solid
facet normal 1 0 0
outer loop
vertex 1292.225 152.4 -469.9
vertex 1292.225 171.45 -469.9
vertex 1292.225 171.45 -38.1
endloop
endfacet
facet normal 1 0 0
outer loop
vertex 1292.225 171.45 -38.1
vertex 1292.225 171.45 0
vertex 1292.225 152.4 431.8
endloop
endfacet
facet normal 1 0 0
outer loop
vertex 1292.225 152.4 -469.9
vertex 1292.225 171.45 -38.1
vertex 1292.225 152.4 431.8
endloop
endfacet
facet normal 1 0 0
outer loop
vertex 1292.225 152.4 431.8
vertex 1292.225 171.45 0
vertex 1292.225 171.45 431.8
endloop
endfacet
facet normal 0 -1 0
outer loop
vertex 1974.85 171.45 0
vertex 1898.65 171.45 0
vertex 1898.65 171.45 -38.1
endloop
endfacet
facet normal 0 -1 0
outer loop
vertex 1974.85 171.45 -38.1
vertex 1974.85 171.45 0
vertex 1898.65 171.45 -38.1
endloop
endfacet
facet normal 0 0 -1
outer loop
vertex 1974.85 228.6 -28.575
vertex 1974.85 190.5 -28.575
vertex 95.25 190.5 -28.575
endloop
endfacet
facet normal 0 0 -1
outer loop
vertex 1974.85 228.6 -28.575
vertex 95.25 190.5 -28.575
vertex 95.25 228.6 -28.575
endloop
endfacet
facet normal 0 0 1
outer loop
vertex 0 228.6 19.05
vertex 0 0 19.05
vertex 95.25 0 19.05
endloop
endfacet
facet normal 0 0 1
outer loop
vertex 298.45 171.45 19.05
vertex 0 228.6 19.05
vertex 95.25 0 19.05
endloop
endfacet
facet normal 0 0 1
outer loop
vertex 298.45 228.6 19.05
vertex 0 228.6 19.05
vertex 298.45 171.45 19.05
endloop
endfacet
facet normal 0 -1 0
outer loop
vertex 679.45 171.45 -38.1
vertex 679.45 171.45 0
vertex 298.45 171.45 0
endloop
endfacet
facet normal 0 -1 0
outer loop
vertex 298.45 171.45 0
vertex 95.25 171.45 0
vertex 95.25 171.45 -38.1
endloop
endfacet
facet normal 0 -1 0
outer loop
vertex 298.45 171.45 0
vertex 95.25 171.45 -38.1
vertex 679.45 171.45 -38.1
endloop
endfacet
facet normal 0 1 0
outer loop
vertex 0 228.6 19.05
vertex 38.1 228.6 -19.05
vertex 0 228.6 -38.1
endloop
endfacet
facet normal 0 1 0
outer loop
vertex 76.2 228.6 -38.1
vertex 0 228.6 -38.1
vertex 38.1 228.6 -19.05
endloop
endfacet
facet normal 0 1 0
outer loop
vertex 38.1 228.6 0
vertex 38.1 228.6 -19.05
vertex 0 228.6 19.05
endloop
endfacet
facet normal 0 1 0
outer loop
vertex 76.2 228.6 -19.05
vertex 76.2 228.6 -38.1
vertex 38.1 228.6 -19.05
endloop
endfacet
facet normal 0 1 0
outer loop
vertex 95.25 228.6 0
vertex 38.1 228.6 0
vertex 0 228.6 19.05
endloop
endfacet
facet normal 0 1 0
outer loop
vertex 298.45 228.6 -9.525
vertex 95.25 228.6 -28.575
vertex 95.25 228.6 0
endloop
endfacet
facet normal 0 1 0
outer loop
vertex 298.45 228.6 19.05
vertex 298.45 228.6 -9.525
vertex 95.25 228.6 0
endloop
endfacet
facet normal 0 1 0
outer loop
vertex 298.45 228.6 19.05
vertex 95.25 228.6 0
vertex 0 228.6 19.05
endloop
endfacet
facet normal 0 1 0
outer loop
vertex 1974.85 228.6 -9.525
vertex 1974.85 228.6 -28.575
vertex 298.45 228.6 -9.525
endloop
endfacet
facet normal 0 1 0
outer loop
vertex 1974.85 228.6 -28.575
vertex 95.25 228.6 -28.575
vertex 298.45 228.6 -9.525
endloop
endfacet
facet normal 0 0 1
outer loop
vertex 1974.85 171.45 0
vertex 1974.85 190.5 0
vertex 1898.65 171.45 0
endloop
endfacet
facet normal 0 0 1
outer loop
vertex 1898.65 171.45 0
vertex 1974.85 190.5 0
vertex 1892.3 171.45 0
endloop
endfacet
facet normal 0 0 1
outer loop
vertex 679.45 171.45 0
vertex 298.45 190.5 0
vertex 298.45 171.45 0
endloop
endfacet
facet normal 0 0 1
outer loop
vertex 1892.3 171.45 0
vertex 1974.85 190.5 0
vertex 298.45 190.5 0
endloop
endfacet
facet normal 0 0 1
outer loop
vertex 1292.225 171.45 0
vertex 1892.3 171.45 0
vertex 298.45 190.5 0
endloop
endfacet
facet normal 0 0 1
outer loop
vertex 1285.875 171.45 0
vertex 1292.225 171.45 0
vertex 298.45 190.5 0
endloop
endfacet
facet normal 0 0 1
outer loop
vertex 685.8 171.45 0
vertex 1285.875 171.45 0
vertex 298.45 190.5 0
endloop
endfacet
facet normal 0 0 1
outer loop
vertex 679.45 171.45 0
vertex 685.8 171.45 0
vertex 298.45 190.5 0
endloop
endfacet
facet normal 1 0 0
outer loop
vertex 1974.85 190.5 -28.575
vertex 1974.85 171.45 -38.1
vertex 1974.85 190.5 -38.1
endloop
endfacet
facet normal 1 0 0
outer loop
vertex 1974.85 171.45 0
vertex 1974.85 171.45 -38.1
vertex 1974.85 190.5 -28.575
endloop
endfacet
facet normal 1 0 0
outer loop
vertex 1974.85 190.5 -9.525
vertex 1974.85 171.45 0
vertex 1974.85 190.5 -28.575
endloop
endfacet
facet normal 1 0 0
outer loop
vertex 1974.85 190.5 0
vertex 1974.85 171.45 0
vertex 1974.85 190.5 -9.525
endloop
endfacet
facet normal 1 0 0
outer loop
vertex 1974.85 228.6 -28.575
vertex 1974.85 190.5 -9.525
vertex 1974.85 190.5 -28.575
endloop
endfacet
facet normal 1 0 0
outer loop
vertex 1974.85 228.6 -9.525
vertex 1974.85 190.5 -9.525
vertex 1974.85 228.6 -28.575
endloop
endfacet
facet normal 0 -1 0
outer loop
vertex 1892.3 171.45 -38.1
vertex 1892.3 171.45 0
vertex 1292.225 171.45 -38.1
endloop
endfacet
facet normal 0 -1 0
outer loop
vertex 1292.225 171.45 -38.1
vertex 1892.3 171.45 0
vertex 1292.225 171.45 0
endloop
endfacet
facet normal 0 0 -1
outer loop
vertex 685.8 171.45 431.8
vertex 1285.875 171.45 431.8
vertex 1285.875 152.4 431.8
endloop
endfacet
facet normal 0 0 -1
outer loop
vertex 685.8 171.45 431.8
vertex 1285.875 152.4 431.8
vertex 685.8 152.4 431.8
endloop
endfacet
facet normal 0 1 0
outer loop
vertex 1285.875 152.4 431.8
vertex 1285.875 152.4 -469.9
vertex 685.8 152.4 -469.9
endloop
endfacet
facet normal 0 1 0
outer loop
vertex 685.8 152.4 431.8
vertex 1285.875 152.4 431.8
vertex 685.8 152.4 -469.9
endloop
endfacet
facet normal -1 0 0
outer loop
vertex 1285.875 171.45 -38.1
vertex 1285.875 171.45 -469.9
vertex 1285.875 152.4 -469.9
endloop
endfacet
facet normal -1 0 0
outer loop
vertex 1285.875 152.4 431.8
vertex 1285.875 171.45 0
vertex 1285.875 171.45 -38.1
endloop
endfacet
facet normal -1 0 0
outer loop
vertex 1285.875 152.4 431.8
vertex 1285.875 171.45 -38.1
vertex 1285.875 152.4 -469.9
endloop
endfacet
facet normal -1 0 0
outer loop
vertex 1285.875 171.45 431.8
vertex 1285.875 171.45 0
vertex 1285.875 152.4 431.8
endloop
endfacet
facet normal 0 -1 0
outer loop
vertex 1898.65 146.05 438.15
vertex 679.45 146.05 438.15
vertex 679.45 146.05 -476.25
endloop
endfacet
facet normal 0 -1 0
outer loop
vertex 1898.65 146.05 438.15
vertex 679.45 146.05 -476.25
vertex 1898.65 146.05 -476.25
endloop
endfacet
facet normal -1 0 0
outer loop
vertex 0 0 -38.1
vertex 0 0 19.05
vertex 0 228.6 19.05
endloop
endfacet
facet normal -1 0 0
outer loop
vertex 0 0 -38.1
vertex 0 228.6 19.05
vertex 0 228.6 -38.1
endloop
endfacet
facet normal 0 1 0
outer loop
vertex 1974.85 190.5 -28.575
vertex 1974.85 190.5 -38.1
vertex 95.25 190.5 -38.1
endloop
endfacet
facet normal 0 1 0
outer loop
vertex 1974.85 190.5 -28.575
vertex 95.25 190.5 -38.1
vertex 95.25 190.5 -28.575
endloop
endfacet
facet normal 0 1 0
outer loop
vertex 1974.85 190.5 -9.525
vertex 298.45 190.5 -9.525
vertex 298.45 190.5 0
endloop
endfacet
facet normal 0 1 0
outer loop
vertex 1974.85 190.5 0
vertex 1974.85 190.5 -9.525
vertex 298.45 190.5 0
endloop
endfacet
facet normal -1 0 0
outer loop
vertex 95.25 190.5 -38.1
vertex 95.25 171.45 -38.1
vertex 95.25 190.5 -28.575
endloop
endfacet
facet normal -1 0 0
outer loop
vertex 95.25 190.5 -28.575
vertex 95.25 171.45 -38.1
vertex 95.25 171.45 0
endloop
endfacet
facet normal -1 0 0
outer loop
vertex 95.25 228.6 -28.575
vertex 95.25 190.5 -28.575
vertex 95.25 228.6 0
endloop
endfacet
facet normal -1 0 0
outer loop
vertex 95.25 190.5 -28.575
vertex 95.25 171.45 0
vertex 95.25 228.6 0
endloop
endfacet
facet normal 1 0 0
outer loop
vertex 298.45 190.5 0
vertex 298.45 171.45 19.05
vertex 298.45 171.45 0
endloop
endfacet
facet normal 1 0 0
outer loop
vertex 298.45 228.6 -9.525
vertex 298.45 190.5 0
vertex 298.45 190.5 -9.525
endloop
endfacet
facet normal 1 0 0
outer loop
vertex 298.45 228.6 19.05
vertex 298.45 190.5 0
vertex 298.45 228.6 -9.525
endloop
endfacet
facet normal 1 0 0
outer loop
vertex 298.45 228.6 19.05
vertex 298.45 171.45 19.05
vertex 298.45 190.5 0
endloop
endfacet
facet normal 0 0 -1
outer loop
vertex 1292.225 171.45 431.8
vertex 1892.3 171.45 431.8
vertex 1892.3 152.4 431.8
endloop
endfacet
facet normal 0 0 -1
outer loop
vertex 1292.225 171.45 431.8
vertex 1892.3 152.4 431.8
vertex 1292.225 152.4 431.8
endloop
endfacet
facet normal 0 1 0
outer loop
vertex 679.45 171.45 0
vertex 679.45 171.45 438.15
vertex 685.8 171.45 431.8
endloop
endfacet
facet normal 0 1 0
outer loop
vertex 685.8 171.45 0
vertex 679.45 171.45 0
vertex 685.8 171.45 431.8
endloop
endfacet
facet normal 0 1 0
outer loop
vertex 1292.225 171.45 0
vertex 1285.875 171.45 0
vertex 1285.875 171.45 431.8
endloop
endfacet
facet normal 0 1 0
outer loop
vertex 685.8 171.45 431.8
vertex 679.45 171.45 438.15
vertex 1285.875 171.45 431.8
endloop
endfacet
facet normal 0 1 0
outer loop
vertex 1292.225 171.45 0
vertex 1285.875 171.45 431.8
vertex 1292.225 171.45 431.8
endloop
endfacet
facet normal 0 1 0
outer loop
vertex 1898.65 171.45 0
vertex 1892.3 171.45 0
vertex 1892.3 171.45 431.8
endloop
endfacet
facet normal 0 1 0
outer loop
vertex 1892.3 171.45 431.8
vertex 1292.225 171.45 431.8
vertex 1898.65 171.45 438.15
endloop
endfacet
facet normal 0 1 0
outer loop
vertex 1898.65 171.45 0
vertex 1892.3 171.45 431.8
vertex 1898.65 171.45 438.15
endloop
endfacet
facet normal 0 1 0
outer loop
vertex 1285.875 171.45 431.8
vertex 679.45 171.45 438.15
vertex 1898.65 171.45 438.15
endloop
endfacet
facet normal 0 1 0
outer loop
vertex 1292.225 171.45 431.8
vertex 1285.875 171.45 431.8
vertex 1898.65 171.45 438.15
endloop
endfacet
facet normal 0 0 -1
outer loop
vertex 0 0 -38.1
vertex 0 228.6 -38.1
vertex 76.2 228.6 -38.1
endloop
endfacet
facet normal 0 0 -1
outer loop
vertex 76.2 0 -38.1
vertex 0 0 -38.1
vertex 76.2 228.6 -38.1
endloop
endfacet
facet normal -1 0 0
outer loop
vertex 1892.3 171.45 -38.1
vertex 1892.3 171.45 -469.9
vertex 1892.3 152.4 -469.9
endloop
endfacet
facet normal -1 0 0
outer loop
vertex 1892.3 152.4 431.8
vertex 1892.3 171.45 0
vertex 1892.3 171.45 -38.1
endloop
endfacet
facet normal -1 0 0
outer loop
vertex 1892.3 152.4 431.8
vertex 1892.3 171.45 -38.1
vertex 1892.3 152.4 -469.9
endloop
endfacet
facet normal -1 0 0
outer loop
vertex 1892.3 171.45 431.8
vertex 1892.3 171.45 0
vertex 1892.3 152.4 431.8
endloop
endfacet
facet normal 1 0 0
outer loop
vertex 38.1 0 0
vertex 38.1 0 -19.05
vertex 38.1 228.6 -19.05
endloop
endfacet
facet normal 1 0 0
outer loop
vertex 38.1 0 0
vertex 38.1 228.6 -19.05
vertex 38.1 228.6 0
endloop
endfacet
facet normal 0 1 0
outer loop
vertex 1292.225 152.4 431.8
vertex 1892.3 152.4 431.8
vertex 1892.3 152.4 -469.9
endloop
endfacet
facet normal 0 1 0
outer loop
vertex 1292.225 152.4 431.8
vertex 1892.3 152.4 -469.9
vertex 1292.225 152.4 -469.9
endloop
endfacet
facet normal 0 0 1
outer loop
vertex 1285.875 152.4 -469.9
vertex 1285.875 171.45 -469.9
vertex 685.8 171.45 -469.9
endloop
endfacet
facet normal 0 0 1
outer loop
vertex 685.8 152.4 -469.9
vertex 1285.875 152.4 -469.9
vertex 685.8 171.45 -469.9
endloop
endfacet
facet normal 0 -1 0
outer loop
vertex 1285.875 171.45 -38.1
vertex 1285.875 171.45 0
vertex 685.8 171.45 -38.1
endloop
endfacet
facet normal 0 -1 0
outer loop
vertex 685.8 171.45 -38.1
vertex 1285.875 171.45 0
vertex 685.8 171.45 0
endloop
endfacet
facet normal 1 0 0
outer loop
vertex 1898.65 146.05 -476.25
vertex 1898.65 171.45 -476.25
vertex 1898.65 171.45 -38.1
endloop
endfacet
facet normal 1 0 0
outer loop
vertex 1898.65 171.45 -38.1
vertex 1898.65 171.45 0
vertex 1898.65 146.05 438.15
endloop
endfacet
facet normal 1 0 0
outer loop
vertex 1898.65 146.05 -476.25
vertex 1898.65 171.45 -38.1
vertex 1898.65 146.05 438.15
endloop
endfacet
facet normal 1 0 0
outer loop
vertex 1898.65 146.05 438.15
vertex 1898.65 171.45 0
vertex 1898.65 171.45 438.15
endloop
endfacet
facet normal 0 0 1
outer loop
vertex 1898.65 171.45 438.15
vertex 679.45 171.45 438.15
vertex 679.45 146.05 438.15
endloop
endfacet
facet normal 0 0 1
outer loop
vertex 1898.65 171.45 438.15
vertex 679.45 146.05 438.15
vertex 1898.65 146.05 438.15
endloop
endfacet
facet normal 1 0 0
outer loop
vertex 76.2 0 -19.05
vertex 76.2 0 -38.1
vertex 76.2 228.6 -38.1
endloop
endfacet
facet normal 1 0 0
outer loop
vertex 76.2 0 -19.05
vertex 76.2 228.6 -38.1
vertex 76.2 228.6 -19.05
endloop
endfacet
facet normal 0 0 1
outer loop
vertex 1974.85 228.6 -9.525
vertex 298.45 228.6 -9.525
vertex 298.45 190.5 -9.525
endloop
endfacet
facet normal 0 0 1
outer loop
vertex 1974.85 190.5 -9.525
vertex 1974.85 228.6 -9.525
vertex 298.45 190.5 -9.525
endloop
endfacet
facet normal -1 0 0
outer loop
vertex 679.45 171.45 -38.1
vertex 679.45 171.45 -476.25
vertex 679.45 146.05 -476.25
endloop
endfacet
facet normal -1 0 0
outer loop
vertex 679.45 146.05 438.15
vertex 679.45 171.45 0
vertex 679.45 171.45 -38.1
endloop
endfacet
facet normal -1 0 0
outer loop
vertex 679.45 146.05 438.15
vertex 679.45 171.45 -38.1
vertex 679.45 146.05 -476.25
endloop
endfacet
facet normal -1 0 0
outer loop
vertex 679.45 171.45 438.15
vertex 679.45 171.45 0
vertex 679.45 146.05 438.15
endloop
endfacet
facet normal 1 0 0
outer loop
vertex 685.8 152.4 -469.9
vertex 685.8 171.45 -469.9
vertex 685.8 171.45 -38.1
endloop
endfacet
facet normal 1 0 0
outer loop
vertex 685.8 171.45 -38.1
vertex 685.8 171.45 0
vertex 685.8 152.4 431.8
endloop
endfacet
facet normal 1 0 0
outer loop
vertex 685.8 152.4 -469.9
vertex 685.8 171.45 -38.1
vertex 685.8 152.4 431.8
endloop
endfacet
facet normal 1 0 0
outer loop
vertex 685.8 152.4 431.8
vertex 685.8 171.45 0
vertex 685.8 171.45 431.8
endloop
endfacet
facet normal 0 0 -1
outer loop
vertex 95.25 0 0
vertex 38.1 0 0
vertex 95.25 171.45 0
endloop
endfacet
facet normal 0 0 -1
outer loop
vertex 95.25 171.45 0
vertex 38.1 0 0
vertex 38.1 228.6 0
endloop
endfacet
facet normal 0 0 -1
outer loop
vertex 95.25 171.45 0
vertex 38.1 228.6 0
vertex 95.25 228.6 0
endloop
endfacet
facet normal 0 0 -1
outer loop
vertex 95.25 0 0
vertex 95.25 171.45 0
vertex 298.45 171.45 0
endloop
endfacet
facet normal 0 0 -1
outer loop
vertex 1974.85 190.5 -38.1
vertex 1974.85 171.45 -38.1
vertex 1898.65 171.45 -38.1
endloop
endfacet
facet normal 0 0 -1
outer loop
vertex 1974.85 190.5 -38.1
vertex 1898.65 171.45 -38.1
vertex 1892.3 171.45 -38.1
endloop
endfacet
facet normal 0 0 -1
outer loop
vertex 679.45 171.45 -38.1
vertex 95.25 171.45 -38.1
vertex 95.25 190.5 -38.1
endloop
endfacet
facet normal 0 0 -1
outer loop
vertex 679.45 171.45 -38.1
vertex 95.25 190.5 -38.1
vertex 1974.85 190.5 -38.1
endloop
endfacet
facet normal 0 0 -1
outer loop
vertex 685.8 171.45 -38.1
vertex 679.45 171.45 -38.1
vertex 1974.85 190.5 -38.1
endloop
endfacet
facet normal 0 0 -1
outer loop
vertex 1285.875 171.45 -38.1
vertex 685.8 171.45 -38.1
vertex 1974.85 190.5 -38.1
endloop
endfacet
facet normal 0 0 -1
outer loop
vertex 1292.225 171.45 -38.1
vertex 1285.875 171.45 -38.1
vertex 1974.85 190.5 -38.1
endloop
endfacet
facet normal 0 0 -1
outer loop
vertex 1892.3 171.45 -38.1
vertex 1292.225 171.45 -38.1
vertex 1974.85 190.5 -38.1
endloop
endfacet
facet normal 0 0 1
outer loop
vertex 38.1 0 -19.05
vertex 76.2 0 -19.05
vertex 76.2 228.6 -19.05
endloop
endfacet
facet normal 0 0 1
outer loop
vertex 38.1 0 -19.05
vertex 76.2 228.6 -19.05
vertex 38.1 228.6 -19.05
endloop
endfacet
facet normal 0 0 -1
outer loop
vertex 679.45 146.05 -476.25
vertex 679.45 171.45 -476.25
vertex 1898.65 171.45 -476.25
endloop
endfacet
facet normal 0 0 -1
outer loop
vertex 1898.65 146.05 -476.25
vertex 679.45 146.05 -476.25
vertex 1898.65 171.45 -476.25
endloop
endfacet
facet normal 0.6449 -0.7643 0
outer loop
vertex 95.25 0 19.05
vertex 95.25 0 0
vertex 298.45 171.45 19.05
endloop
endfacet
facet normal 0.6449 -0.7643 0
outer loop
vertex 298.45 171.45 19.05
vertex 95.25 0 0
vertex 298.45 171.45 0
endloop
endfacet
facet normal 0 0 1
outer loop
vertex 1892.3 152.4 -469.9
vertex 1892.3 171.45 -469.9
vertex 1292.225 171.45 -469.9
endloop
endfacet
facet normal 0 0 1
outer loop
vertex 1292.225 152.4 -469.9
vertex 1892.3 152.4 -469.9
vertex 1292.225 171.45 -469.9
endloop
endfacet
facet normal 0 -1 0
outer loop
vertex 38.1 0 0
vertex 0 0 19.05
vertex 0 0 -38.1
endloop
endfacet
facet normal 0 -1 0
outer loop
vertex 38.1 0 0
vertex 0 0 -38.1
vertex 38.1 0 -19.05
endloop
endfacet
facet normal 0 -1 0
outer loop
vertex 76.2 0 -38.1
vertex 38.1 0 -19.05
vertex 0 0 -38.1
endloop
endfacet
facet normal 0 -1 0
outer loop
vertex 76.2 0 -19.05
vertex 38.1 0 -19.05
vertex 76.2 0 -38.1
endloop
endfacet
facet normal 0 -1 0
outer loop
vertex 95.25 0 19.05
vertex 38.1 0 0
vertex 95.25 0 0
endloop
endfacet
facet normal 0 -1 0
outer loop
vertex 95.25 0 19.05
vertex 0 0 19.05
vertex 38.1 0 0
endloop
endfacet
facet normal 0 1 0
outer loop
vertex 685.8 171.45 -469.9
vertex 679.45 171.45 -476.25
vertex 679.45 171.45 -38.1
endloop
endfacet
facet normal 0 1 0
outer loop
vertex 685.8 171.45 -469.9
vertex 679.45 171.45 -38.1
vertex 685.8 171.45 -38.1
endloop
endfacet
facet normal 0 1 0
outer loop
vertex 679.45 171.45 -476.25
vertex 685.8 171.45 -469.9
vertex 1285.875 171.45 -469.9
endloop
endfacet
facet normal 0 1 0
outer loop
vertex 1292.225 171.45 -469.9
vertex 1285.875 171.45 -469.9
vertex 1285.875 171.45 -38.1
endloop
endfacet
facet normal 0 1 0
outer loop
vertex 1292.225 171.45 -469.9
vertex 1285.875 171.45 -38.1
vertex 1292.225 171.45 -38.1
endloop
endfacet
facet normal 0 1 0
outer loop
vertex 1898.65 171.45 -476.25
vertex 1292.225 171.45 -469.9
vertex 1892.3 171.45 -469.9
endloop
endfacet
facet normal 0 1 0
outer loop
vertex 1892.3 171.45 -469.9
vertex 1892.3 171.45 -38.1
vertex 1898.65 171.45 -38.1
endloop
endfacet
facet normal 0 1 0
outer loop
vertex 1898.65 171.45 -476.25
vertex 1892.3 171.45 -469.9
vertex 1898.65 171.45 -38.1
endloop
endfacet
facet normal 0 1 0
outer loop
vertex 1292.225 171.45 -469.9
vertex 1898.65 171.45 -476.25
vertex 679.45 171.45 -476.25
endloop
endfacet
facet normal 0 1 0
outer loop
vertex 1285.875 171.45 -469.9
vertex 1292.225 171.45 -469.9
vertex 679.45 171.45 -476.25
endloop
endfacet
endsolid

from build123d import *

# Parameters (mm, degrees)
F1_DEPTH      = 19.05
F3_DEPTH      = 228.6
F5_DEPTH      = 203.2
F5_DEPTH_BACK = 1676.4
F6_W          = 38.1
F6_H          = 9.525
F7_DEPTH      = 203.2
F8_W          = 1219.2
F8_H          = 914.4
F9_DEPTH      = 25.4
F10_W         = 600.075
F10_H         = 901.7
F11_DEPTH     = 19.05


with BuildPart() as f1:
    # F0 (on Top) → F1 (new body)
    with BuildSketch(Plane.XY):
        Polygon((0, 228.6), (0, 0), (95.25, 0), (298.45, 171.45), (298.45, 228.6), align=None)
    extrude(amount=F1_DEPTH)

    # F2 (on face) → F3 (join)
    with BuildSketch(Plane.XZ):
        Polygon((38.1, 0), (0, 0), (0, -38.1), (38.1, -38.1), (76.2, -38.1), (76.2, -19.05), (38.1, -19.05), align=None)
    extrude(amount=-F3_DEPTH)

    # F4 (on face) → F5 (join, two sides)
    with BuildSketch(Plane.YZ.offset(298.45)) as f5_sk:
        Polygon((190.5, 0), (171.45, 0), (171.45, -38.1), (190.5, -38.1), (190.5, -28.575), (228.6, -28.575), (228.6, -9.525), (190.5, -9.525), align=None)
    extrude(amount=-F5_DEPTH)
    extrude(f5_sk.sketch, amount=F5_DEPTH_BACK)

    # F6 (on face) → F7 (join)
    with BuildSketch(Plane.YZ.offset(298.45)):
        with Locations((209.55, -4.7625)):
            Rectangle(F6_W, F6_H)
    extrude(amount=-F7_DEPTH)

    # F8 (on face) → F9 (join)
    with BuildSketch(Plane.XZ.offset(-171.45)):
        with Locations((1289.05, -19.05)):
            Rectangle(F8_W, F8_H)
    extrude(amount=F9_DEPTH)

    # F10 (on face) → F11 (cut)
    with BuildSketch(Plane(origin=(0, 171.45, 0), x_dir=(-1, 0, 0), z_dir=(0, 1, 0))):
        with Locations((-1592.2625, -19.05)):
            Rectangle(F10_W, F10_H)
        with Locations((-985.8375, -19.05)):
            Rectangle(F10_W, F10_H)
    extrude(amount=-F11_DEPTH, mode=Mode.SUBTRACT)


solid = f1.part
